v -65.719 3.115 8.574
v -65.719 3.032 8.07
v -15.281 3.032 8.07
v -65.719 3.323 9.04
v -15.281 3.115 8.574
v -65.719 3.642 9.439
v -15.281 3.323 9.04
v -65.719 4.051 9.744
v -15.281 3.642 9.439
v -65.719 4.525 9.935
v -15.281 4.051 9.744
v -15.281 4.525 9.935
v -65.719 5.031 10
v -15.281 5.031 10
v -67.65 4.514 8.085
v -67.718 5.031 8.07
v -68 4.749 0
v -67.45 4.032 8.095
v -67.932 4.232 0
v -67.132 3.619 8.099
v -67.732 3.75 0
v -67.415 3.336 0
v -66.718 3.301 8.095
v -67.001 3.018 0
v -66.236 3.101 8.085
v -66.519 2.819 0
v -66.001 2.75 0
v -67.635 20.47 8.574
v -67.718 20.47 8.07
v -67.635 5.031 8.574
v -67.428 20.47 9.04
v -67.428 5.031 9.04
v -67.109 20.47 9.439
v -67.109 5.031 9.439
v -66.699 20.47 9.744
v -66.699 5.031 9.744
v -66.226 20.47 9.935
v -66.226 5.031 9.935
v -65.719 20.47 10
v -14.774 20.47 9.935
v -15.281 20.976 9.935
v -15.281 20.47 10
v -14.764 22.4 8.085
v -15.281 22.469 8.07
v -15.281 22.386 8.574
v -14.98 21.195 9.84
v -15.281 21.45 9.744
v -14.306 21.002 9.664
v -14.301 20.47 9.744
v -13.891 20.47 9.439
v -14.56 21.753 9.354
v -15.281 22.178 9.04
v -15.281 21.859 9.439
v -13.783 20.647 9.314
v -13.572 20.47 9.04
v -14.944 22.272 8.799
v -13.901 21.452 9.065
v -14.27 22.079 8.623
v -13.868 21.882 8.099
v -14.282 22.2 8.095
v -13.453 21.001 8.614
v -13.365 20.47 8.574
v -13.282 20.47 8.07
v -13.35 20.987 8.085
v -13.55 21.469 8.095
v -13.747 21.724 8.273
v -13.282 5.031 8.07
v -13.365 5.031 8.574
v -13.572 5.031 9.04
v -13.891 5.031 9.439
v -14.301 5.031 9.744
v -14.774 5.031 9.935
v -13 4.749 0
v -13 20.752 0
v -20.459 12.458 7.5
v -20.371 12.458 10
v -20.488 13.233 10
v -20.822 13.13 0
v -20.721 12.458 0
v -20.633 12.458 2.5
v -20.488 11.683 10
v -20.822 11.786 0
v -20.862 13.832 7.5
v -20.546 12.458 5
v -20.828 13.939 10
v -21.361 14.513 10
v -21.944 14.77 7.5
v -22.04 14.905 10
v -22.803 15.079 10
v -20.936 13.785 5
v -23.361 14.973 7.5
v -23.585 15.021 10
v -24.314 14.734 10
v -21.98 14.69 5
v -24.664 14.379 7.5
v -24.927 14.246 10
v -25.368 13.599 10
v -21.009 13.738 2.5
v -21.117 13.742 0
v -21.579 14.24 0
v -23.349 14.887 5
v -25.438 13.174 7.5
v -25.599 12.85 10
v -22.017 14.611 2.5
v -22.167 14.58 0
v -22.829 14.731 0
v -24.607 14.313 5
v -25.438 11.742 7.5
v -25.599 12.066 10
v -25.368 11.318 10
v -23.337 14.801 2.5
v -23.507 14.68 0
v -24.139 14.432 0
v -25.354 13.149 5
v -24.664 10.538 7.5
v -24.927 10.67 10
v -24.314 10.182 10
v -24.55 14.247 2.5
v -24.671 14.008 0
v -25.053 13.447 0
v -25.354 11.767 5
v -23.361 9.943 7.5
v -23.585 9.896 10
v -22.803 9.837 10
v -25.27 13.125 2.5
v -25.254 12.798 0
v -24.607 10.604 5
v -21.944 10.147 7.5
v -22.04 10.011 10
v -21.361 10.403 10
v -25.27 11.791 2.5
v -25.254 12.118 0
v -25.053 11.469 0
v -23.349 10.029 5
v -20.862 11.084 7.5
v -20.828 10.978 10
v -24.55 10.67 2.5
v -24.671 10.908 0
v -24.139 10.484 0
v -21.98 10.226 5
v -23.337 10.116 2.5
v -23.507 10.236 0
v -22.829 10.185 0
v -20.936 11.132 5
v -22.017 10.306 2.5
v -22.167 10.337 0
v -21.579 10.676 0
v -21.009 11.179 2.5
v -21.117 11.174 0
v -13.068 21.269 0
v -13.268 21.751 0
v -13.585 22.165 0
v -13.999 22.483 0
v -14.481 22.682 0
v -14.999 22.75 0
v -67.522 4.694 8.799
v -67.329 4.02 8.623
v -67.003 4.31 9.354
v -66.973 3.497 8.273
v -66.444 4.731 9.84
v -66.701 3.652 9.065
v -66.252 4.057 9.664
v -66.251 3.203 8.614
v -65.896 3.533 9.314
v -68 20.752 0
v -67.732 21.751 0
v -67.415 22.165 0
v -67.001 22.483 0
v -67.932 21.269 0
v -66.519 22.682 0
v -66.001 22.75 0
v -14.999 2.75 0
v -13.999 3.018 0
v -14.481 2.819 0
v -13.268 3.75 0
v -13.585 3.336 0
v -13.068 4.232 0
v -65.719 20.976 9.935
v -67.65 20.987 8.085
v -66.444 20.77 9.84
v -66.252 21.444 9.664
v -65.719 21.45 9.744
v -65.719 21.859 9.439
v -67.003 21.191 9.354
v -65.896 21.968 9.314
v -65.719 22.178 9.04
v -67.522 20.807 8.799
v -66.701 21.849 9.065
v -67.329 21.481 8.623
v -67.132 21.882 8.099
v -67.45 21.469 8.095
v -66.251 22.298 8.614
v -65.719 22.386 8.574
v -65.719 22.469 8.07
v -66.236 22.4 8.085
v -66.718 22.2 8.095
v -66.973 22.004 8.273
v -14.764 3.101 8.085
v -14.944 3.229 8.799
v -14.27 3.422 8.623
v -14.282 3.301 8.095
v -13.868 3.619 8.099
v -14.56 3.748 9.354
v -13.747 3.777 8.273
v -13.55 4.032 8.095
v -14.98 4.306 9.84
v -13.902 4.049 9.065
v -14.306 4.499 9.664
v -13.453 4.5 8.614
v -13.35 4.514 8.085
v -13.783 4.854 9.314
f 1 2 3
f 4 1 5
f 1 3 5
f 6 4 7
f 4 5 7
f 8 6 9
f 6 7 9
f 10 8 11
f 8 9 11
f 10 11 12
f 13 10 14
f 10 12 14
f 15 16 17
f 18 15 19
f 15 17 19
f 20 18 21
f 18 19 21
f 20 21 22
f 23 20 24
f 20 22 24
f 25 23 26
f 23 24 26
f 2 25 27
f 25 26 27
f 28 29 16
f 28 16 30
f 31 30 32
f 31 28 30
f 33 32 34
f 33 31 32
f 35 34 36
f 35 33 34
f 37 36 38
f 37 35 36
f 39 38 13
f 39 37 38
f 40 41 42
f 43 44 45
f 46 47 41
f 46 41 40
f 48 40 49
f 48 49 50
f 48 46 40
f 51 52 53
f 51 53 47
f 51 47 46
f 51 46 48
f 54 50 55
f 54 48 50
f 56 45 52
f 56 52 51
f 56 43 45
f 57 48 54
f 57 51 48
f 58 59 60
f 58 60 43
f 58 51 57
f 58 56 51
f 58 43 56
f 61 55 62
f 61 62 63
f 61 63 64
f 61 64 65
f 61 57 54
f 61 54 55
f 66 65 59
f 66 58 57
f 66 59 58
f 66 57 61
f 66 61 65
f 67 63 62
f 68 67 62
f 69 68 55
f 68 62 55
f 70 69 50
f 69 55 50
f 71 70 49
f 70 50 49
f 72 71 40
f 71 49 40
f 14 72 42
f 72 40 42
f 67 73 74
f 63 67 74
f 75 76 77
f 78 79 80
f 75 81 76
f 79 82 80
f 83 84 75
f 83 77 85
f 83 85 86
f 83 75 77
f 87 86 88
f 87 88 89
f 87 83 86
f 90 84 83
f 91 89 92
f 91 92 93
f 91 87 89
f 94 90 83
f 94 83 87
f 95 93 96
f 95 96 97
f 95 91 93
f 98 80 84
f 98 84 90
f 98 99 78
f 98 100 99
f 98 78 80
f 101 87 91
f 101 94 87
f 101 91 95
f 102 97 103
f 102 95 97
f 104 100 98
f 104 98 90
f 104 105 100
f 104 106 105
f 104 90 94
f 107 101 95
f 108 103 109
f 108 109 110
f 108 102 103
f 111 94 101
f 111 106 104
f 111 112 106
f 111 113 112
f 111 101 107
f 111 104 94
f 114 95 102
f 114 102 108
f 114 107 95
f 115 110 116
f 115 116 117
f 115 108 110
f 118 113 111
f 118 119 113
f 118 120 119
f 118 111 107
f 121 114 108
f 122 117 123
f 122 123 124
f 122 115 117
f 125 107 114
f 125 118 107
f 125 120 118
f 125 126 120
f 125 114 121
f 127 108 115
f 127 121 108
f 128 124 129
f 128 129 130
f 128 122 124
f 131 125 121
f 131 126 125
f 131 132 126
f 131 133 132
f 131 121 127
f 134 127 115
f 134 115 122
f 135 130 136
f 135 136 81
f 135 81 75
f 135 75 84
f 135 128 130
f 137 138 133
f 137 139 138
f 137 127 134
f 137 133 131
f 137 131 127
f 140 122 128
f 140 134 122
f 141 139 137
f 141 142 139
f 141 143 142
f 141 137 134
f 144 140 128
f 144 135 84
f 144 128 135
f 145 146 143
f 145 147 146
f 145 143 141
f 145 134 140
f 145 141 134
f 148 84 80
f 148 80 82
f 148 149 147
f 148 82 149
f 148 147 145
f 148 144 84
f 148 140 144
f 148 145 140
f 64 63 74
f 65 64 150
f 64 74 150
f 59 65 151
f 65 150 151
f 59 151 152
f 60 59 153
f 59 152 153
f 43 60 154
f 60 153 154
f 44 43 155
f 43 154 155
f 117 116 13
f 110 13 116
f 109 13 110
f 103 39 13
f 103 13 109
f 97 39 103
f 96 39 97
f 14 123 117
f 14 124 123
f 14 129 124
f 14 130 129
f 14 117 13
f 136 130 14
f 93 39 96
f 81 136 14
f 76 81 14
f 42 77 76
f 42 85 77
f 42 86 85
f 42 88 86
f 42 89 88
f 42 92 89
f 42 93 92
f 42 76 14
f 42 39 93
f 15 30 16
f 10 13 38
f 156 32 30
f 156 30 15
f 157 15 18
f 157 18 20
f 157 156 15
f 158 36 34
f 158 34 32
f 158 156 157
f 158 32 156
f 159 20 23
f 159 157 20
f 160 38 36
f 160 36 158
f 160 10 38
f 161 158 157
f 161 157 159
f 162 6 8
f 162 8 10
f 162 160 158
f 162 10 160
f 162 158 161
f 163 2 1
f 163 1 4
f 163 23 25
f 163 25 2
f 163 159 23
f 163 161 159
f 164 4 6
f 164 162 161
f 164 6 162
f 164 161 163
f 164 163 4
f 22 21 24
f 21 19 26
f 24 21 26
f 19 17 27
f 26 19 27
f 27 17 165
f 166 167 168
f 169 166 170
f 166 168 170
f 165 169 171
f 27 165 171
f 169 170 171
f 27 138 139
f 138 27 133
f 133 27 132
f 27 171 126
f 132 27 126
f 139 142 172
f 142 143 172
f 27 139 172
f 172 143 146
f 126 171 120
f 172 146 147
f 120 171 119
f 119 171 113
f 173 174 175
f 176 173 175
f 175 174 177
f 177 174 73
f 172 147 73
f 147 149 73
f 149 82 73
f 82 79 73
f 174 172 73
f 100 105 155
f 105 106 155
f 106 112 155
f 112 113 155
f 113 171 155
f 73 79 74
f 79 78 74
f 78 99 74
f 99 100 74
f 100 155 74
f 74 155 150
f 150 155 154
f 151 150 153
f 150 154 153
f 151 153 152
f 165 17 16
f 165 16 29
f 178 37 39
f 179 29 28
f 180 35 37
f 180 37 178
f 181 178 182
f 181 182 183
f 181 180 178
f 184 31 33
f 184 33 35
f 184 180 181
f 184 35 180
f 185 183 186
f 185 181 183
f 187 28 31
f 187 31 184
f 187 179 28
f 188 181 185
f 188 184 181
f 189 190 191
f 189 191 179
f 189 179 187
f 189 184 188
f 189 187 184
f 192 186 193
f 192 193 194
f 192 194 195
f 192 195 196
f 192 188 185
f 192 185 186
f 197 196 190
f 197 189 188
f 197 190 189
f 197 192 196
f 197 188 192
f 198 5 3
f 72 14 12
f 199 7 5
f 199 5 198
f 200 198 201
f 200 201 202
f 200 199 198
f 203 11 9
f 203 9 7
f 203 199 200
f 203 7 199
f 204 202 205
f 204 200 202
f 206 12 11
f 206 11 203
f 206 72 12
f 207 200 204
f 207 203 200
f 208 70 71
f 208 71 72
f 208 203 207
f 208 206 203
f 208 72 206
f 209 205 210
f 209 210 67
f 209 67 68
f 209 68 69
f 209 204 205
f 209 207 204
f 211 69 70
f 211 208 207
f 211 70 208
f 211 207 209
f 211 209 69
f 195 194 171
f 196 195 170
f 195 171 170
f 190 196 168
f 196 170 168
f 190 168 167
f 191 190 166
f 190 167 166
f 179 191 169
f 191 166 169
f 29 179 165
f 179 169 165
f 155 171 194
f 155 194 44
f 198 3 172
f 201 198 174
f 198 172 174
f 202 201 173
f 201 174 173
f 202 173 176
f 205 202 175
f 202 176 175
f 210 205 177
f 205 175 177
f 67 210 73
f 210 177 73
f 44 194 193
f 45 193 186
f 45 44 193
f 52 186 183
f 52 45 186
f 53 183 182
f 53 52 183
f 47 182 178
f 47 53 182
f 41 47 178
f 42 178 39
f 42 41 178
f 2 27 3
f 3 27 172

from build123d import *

# Parameters (mm, degrees)
SKETCH1_W           = 55
SKETCH1_H           = 20
SKETCH1_R           = 2.279195974
BOSS_EXTRUDE1_DEPTH = 10
BOSS_EXTRUDE1_DRAFT = 2
FILLET1_R           = 2
FILLET2_R           = 2


with BuildPart() as part:
    # Sketch1 → Boss-Extrude1 (with draft: the straight prism first)
    with BuildSketch(Plane.XY):
        with Locations((-40.5, 12.750475985)):
            Rectangle(SKETCH1_W, SKETCH1_H)
        with Locations((-22.9997867, 12.458174308)):
            Circle(SKETCH1_R, mode=Mode.SUBTRACT)
    extrude(amount=BOSS_EXTRUDE1_DEPTH)
    # Boss-Extrude1: the draft: its side faces are tilted about the plane it starts from
    boss_extrude1_sides = [part.faces().sort_by_distance(p)[0] for p in [
        (-13, 12.750475985, 5),
        (-40.5, 22.750475985, 5),
        (-68, 12.750475985, 5),
        (-40.5, 2.750475985, 5),
        (-25.278982673, 12.458174308, 5),
    ]]
    draft(boss_extrude1_sides, Plane.XY, BOSS_EXTRUDE1_DRAFT)

    # Fillet1
    fillet1_edges = [part.edges().sort_by_distance(p)[0] for p in [
        (-67.650792305, 12.750475985, 10),
        (-40.5, 3.09968368, 10),
        (-13.349207695, 12.750475985, 10),
        (-40.5, 22.40126829, 10),
    ]]
    fillet(fillet1_edges, radius=FILLET1_R)

    # Fillet2
    # the kernel refuses this fillet: 2 mm, written as the material it takes off along each edge
    with BuildSketch(Plane(origin=(-65.719414755, 20.469890741, 8), x_dir=(-0.719128245661317, 0.024250870657585206, -0.6944540744818377), z_dir=(-0.5638062984383352, 0.5638062984383351, 0.6035270629247093))) as fillet2_piece_1_section:
        Polygon((-4.062392326, -4.062392326), (4.062392326, -4.062392326), (4.062392326, 4.062392326), (-4.062392326, 4.062392326), align=None)
    fillet2_piece_1 = extrude(amount=4.062392326, mode=Mode.PRIVATE)
    fillet2_piece_1 = split(fillet2_piece_1, bisect_by=Plane(origin=(-65.719414755, 20.469890741, 8), z_dir=(0.03487826274237467, -0.03487826274237466, 0.9987827659587183)), keep=Keep.TOP, mode=Mode.PRIVATE)
    fillet2_piece_1 = split(fillet2_piece_1, bisect_by=Plane(origin=(-65.719414755, 20.469890741, 8), z_dir=(0, 1, 0)), keep=Keep.TOP, mode=Mode.PRIVATE)
    fillet2_piece_1 = split(fillet2_piece_1, bisect_by=Plane(origin=(-65.719414755, 20.469890741, 8), z_dir=(-1, 0, 0)), keep=Keep.TOP, mode=Mode.PRIVATE)
    fillet2_piece_1 = split(fillet2_piece_1, bisect_by=Plane(origin=(-65.719414755, 22.468672395, 8.069798993), z_dir=(0, -0.9993908270190958, -0.03489949670250102)), keep=Keep.TOP, mode=Mode.PRIVATE)
    fillet2_piece_1 = split(fillet2_piece_1, bisect_by=Plane(origin=(-67.71819641, 20.469890741, 8.069798993), z_dir=(0.9993908270190958, 0, -0.03489949670250102)), keep=Keep.TOP, mode=Mode.PRIVATE)
    fillet2_piece_1 = split(fillet2_piece_1, bisect_by=Plane(origin=(-65.719414755, 20.469890741, 10), z_dir=(0, 0, -1)), keep=Keep.TOP, mode=Mode.PRIVATE)
    fillet2_piece_1 = fillet2_piece_1 - Plane(origin=(-65.719414755, 20.469890741, 8), x_dir=(0.5638062984383352, -0.5638062984383351, -0.6035270629247093), z_dir=(-0.719128245661317, 0.024250870657585206, -0.6944540744818377)) * Sphere(FILLET2_R, mode=Mode.PRIVATE)
    add(fillet2_piece_1, mode=Mode.SUBTRACT)
    with BuildSketch(Plane(origin=(-15.280585245, 20.469890741, 8), x_dir=(0.024250870657585296, 0.719128245661317, -0.6944540744818377), z_dir=(0.5638062984383351, 0.5638062984383351, 0.6035270629247093))) as fillet2_piece_2_section:
        Polygon((-4.062392326, -4.062392326), (4.062392326, -4.062392326), (4.062392326, 4.062392326), (-4.062392326, 4.062392326), align=None)
    fillet2_piece_2 = extrude(amount=4.062392326, mode=Mode.PRIVATE)
    fillet2_piece_2 = split(fillet2_piece_2, bisect_by=Plane(origin=(-15.280585245, 20.469890741, 8), z_dir=(-0.03487826274237467, -0.034878262742374676, 0.9987827659587183)), keep=Keep.TOP, mode=Mode.PRIVATE)
    fillet2_piece_2 = split(fillet2_piece_2, bisect_by=Plane(origin=(-15.280585245, 20.469890741, 8), z_dir=(1, 0, 0)), keep=Keep.TOP, mode=Mode.PRIVATE)
    fillet2_piece_2 = split(fillet2_piece_2, bisect_by=Plane(origin=(-15.280585245, 20.469890741, 8), z_dir=(0, 1, 0)), keep=Keep.TOP, mode=Mode.PRIVATE)
    fillet2_piece_2 = split(fillet2_piece_2, bisect_by=Plane(origin=(-13.28180359, 20.469890741, 8.069798993), z_dir=(-0.9993908270190958, 0, -0.03489949670250102)), keep=Keep.TOP, mode=Mode.PRIVATE)
    fillet2_piece_2 = split(fillet2_piece_2, bisect_by=Plane(origin=(-15.280585245, 22.468672395, 8.069798993), z_dir=(0, -0.9993908270190958, -0.03489949670250102)), keep=Keep.TOP, mode=Mode.PRIVATE)
    fillet2_piece_2 = split(fillet2_piece_2, bisect_by=Plane(origin=(-15.280585245, 20.469890741, 10), z_dir=(0, 0, -1)), keep=Keep.TOP, mode=Mode.PRIVATE)
    fillet2_piece_2 = fillet2_piece_2 - Plane(origin=(-15.280585245, 20.469890741, 8), x_dir=(-0.5638062984383351, -0.5638062984383351, -0.6035270629247093), z_dir=(0.024250870657585296, 0.719128245661317, -0.6944540744818377)) * Sphere(FILLET2_R, mode=Mode.PRIVATE)
    add(fillet2_piece_2, mode=Mode.SUBTRACT)
    with BuildSketch(Plane(origin=(-65.719414755, 5.03106123, 8), x_dir=(0.7191282456613168, 0.0242508706575854, 0.6944540744818378), z_dir=(-0.5638062984383351, -0.5638062984383351, 0.6035270629247093))) as fillet2_piece_3_section:
        Polygon((-4.062392326, -4.062392326), (4.062392326, -4.062392326), (4.062392326, 4.062392326), (-4.062392326, 4.062392326), align=None)
    fillet2_piece_3 = extrude(amount=4.062392326, mode=Mode.PRIVATE)
    fillet2_piece_3 = split(fillet2_piece_3, bisect_by=Plane(origin=(-65.719414755, 5.03106123, 8), z_dir=(0.03487826274237467, 0.034878262742374676, 0.9987827659587183)), keep=Keep.TOP, mode=Mode.PRIVATE)
    fillet2_piece_3 = split(fillet2_piece_3, bisect_by=Plane(origin=(-65.719414755, 5.03106123, 8), z_dir=(0, -1, 0)), keep=Keep.TOP, mode=Mode.PRIVATE)
    fillet2_piece_3 = split(fillet2_piece_3, bisect_by=Plane(origin=(-65.719414755, 5.03106123, 8), z_dir=(-1, 0, 0)), keep=Keep.TOP, mode=Mode.PRIVATE)
    fillet2_piece_3 = split(fillet2_piece_3, bisect_by=Plane(origin=(-65.719414755, 3.032279576, 8.069798993), z_dir=(0, 0.9993908270190958, -0.03489949670250102)), keep=Keep.TOP, mode=Mode.PRIVATE)
    fillet2_piece_3 = split(fillet2_piece_3, bisect_by=Plane(origin=(-67.71819641, 5.03106123, 8.069798993), z_dir=(0.9993908270190958, 0, -0.03489949670250102)), keep=Keep.TOP, mode=Mode.PRIVATE)
    fillet2_piece_3 = split(fillet2_piece_3, bisect_by=Plane(origin=(-65.719414755, 5.03106123, 10), z_dir=(0, 0, -1)), keep=Keep.TOP, mode=Mode.PRIVATE)
    fillet2_piece_3 = fillet2_piece_3 - Plane(origin=(-65.719414755, 5.03106123, 8), x_dir=(0.5638062984383351, 0.5638062984383351, -0.6035270629247093), z_dir=(0.7191282456613168, 0.0242508706575854, 0.6944540744818378)) * Sphere(FILLET2_R, mode=Mode.PRIVATE)
    add(fillet2_piece_3, mode=Mode.SUBTRACT)
    with BuildSketch(Plane(origin=(-15.280585245, 5.03106123, 8), x_dir=(-0.024250870657585296, 0.719128245661317, 0.6944540744818377), z_dir=(0.5638062984383352, -0.5638062984383351, 0.6035270629247093))) as fillet2_piece_4_section:
        Polygon((-4.062392326, -4.062392326), (4.062392326, -4.062392326), (4.062392326, 4.062392326), (-4.062392326, 4.062392326), align=None)
    fillet2_piece_4 = extrude(amount=4.062392326, mode=Mode.PRIVATE)
    fillet2_piece_4 = split(fillet2_piece_4, bisect_by=Plane(origin=(-15.280585245, 5.03106123, 8), z_dir=(-0.03487826274237467, 0.03487826274237466, 0.9987827659587183)), keep=Keep.TOP, mode=Mode.PRIVATE)
    fillet2_piece_4 = split(fillet2_piece_4, bisect_by=Plane(origin=(-15.280585245, 5.03106123, 8), z_dir=(1, 0, 0)), keep=Keep.TOP, mode=Mode.PRIVATE)
    fillet2_piece_4 = split(fillet2_piece_4, bisect_by=Plane(origin=(-15.280585245, 5.03106123, 8), z_dir=(0, -1, 0)), keep=Keep.TOP, mode=Mode.PRIVATE)
    fillet2_piece_4 = split(fillet2_piece_4, bisect_by=Plane(origin=(-13.28180359, 5.03106123, 8.069798993), z_dir=(-0.9993908270190958, 0, -0.03489949670250102)), keep=Keep.TOP, mode=Mode.PRIVATE)
    fillet2_piece_4 = split(fillet2_piece_4, bisect_by=Plane(origin=(-15.280585245, 3.032279576, 8.069798993), z_dir=(0, 0.9993908270190958, -0.03489949670250102)), keep=Keep.TOP, mode=Mode.PRIVATE)
    fillet2_piece_4 = split(fillet2_piece_4, bisect_by=Plane(origin=(-15.280585245, 5.03106123, 10), z_dir=(0, 0, -1)), keep=Keep.TOP, mode=Mode.PRIVATE)
    fillet2_piece_4 = fillet2_piece_4 - Plane(origin=(-15.280585245, 5.03106123, 8), x_dir=(-0.5638062984383352, 0.5638062984383351, -0.6035270629247093), z_dir=(-0.024250870657585296, 0.719128245661317, 0.6944540744818377)) * Sphere(FILLET2_R, mode=Mode.PRIVATE)
    add(fillet2_piece_4, mode=Mode.SUBTRACT)
    with BuildSketch(Plane(origin=(-12.825820961, 2.576296946, -4.987835068), x_dir=(0.0012172338155652697, 0.9993915682994698, -0.034857015847091166), z_dir=(-0.03487826274237467, 0.03487826274237466, 0.9987827659587183)), Plane(origin=(-68.174179039, 2.576296946, -4.987835068), x_dir=(0.99939156829947, -0.0012172338155659363, -0.034857015847091145), z_dir=(0.03487826274237467, 0.034878262742374676, 0.9987827659587183))) as fillet2_piece_5:
        with BuildLine():
            CenterArc((FILLET2_R * 0.998782765959, FILLET2_R), FILLET2_R, 180.069784837, 89.930215163)
            Line((-FILLET2_R * 0.00121649230961, FILLET2_R * 0.99878202513), (0, 0))
            Line((0, 0), (FILLET2_R * 0.998782765959, 0))
        make_face()
    extrude(amount=13.14326166, mode=Mode.SUBTRACT)
    with BuildSketch(Plane(origin=(-68.174179039, 22.924655024, -4.987835068), x_dir=(0.99939156829947, 0.001217233815566174, -0.03485701584709114), z_dir=(0.03487826274237467, -0.03487826274237466, 0.9987827659587183)), Plane(origin=(-12.825820961, 22.924655024, -4.987835068), x_dir=(0.0012172338155670467, -0.9993915682994698, -0.03485701584709112), z_dir=(-0.03487826274237467, -0.034878262742374676, 0.9987827659587183))) as fillet2_piece_6:
        with BuildLine():
            CenterArc((FILLET2_R * 0.998782765959, -FILLET2_R), FILLET2_R, 90, 89.930215163)
            Line((-FILLET2_R * 0.00121649230961, -FILLET2_R * 0.99878202513), (0, 0))
            Line((0, 0), (FILLET2_R * 0.998782765959, 0))
        make_face()
    extrude(amount=13.14326166, mode=Mode.SUBTRACT)


solid = part.part
